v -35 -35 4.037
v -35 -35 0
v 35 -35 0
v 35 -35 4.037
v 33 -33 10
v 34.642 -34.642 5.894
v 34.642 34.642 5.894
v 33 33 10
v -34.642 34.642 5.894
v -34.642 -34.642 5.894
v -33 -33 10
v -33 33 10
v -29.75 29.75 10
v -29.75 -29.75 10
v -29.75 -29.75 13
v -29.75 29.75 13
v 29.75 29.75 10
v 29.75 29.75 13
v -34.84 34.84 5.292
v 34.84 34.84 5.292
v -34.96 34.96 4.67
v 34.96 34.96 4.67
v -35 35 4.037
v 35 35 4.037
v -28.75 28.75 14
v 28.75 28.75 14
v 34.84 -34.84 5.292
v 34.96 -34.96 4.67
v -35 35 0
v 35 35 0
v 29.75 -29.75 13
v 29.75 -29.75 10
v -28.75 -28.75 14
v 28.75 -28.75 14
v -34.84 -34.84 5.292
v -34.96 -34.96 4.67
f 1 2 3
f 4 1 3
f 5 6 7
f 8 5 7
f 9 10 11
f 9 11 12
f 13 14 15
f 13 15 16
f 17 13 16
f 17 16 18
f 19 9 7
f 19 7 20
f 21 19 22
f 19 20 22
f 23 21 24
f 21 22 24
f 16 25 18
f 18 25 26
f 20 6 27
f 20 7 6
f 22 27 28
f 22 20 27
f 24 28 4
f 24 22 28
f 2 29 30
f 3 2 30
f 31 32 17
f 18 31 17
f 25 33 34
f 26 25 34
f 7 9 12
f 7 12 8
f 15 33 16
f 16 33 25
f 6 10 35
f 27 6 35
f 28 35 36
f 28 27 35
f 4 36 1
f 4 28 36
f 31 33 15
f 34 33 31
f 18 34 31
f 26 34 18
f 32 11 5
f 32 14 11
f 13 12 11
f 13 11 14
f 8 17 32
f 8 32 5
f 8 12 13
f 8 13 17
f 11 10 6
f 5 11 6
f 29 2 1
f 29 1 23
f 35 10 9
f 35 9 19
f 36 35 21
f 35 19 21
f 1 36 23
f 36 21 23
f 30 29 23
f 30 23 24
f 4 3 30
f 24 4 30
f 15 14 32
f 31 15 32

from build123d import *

# Parameters (mm, degrees)
F0_W     = 59.5
F0_H     = 59.5
F1_DEPTH = 14
F0_W_2   = 70
F0_H_2   = 70
F2_DEPTH = 10
F3_SIZE  = 1
F4_SIZE2 = 5
F4_SIZE  = 2
F5_R     = 5


with BuildPart() as f1:
    # F0 (on Top) → F1 (new body)
    with BuildSketch(Plane.XY):
        Rectangle(F0_W, F0_H)
    extrude(amount=F1_DEPTH)

    # F0 (on Top) → F2 (join)
    with BuildSketch(Plane.XY):
        Rectangle(F0_W_2, F0_H_2)
        Rectangle(F0_W, F0_H, mode=Mode.SUBTRACT)
    extrude(amount=F2_DEPTH)

    # F3
    f3_edges = [f1.edges().sort_by_distance(p)[0] for p in [
        (0, -29.75, 14),
        (29.75, 0, 14),
        (0, 29.75, 14),
        (-29.75, 0, 14),
    ]]
    chamfer(f3_edges, length=F3_SIZE)

    # F4
    f4_edges = [f1.edges().sort_by_distance(p)[0] for p in [
        (0, -35, 10),
        (35, 0, 10),
        (0, 35, 10),
        (-35, 0, 10),
    ]]
    f4_side = f1.faces().sort_by_distance((0, -34.010051, 10))[0]
    chamfer(f4_edges, length=F4_SIZE, length2=F4_SIZE2, reference=f4_side)

    # F5
    f5_edges = [f1.edges().sort_by_distance(p)[0] for p in [
        (35, 0, 5),
        (0, -35, 5),
        (-35, 0, 5),
        (0, 35, 5),
    ]]
    fillet(f5_edges, radius=F5_R)


solid = f1.part
